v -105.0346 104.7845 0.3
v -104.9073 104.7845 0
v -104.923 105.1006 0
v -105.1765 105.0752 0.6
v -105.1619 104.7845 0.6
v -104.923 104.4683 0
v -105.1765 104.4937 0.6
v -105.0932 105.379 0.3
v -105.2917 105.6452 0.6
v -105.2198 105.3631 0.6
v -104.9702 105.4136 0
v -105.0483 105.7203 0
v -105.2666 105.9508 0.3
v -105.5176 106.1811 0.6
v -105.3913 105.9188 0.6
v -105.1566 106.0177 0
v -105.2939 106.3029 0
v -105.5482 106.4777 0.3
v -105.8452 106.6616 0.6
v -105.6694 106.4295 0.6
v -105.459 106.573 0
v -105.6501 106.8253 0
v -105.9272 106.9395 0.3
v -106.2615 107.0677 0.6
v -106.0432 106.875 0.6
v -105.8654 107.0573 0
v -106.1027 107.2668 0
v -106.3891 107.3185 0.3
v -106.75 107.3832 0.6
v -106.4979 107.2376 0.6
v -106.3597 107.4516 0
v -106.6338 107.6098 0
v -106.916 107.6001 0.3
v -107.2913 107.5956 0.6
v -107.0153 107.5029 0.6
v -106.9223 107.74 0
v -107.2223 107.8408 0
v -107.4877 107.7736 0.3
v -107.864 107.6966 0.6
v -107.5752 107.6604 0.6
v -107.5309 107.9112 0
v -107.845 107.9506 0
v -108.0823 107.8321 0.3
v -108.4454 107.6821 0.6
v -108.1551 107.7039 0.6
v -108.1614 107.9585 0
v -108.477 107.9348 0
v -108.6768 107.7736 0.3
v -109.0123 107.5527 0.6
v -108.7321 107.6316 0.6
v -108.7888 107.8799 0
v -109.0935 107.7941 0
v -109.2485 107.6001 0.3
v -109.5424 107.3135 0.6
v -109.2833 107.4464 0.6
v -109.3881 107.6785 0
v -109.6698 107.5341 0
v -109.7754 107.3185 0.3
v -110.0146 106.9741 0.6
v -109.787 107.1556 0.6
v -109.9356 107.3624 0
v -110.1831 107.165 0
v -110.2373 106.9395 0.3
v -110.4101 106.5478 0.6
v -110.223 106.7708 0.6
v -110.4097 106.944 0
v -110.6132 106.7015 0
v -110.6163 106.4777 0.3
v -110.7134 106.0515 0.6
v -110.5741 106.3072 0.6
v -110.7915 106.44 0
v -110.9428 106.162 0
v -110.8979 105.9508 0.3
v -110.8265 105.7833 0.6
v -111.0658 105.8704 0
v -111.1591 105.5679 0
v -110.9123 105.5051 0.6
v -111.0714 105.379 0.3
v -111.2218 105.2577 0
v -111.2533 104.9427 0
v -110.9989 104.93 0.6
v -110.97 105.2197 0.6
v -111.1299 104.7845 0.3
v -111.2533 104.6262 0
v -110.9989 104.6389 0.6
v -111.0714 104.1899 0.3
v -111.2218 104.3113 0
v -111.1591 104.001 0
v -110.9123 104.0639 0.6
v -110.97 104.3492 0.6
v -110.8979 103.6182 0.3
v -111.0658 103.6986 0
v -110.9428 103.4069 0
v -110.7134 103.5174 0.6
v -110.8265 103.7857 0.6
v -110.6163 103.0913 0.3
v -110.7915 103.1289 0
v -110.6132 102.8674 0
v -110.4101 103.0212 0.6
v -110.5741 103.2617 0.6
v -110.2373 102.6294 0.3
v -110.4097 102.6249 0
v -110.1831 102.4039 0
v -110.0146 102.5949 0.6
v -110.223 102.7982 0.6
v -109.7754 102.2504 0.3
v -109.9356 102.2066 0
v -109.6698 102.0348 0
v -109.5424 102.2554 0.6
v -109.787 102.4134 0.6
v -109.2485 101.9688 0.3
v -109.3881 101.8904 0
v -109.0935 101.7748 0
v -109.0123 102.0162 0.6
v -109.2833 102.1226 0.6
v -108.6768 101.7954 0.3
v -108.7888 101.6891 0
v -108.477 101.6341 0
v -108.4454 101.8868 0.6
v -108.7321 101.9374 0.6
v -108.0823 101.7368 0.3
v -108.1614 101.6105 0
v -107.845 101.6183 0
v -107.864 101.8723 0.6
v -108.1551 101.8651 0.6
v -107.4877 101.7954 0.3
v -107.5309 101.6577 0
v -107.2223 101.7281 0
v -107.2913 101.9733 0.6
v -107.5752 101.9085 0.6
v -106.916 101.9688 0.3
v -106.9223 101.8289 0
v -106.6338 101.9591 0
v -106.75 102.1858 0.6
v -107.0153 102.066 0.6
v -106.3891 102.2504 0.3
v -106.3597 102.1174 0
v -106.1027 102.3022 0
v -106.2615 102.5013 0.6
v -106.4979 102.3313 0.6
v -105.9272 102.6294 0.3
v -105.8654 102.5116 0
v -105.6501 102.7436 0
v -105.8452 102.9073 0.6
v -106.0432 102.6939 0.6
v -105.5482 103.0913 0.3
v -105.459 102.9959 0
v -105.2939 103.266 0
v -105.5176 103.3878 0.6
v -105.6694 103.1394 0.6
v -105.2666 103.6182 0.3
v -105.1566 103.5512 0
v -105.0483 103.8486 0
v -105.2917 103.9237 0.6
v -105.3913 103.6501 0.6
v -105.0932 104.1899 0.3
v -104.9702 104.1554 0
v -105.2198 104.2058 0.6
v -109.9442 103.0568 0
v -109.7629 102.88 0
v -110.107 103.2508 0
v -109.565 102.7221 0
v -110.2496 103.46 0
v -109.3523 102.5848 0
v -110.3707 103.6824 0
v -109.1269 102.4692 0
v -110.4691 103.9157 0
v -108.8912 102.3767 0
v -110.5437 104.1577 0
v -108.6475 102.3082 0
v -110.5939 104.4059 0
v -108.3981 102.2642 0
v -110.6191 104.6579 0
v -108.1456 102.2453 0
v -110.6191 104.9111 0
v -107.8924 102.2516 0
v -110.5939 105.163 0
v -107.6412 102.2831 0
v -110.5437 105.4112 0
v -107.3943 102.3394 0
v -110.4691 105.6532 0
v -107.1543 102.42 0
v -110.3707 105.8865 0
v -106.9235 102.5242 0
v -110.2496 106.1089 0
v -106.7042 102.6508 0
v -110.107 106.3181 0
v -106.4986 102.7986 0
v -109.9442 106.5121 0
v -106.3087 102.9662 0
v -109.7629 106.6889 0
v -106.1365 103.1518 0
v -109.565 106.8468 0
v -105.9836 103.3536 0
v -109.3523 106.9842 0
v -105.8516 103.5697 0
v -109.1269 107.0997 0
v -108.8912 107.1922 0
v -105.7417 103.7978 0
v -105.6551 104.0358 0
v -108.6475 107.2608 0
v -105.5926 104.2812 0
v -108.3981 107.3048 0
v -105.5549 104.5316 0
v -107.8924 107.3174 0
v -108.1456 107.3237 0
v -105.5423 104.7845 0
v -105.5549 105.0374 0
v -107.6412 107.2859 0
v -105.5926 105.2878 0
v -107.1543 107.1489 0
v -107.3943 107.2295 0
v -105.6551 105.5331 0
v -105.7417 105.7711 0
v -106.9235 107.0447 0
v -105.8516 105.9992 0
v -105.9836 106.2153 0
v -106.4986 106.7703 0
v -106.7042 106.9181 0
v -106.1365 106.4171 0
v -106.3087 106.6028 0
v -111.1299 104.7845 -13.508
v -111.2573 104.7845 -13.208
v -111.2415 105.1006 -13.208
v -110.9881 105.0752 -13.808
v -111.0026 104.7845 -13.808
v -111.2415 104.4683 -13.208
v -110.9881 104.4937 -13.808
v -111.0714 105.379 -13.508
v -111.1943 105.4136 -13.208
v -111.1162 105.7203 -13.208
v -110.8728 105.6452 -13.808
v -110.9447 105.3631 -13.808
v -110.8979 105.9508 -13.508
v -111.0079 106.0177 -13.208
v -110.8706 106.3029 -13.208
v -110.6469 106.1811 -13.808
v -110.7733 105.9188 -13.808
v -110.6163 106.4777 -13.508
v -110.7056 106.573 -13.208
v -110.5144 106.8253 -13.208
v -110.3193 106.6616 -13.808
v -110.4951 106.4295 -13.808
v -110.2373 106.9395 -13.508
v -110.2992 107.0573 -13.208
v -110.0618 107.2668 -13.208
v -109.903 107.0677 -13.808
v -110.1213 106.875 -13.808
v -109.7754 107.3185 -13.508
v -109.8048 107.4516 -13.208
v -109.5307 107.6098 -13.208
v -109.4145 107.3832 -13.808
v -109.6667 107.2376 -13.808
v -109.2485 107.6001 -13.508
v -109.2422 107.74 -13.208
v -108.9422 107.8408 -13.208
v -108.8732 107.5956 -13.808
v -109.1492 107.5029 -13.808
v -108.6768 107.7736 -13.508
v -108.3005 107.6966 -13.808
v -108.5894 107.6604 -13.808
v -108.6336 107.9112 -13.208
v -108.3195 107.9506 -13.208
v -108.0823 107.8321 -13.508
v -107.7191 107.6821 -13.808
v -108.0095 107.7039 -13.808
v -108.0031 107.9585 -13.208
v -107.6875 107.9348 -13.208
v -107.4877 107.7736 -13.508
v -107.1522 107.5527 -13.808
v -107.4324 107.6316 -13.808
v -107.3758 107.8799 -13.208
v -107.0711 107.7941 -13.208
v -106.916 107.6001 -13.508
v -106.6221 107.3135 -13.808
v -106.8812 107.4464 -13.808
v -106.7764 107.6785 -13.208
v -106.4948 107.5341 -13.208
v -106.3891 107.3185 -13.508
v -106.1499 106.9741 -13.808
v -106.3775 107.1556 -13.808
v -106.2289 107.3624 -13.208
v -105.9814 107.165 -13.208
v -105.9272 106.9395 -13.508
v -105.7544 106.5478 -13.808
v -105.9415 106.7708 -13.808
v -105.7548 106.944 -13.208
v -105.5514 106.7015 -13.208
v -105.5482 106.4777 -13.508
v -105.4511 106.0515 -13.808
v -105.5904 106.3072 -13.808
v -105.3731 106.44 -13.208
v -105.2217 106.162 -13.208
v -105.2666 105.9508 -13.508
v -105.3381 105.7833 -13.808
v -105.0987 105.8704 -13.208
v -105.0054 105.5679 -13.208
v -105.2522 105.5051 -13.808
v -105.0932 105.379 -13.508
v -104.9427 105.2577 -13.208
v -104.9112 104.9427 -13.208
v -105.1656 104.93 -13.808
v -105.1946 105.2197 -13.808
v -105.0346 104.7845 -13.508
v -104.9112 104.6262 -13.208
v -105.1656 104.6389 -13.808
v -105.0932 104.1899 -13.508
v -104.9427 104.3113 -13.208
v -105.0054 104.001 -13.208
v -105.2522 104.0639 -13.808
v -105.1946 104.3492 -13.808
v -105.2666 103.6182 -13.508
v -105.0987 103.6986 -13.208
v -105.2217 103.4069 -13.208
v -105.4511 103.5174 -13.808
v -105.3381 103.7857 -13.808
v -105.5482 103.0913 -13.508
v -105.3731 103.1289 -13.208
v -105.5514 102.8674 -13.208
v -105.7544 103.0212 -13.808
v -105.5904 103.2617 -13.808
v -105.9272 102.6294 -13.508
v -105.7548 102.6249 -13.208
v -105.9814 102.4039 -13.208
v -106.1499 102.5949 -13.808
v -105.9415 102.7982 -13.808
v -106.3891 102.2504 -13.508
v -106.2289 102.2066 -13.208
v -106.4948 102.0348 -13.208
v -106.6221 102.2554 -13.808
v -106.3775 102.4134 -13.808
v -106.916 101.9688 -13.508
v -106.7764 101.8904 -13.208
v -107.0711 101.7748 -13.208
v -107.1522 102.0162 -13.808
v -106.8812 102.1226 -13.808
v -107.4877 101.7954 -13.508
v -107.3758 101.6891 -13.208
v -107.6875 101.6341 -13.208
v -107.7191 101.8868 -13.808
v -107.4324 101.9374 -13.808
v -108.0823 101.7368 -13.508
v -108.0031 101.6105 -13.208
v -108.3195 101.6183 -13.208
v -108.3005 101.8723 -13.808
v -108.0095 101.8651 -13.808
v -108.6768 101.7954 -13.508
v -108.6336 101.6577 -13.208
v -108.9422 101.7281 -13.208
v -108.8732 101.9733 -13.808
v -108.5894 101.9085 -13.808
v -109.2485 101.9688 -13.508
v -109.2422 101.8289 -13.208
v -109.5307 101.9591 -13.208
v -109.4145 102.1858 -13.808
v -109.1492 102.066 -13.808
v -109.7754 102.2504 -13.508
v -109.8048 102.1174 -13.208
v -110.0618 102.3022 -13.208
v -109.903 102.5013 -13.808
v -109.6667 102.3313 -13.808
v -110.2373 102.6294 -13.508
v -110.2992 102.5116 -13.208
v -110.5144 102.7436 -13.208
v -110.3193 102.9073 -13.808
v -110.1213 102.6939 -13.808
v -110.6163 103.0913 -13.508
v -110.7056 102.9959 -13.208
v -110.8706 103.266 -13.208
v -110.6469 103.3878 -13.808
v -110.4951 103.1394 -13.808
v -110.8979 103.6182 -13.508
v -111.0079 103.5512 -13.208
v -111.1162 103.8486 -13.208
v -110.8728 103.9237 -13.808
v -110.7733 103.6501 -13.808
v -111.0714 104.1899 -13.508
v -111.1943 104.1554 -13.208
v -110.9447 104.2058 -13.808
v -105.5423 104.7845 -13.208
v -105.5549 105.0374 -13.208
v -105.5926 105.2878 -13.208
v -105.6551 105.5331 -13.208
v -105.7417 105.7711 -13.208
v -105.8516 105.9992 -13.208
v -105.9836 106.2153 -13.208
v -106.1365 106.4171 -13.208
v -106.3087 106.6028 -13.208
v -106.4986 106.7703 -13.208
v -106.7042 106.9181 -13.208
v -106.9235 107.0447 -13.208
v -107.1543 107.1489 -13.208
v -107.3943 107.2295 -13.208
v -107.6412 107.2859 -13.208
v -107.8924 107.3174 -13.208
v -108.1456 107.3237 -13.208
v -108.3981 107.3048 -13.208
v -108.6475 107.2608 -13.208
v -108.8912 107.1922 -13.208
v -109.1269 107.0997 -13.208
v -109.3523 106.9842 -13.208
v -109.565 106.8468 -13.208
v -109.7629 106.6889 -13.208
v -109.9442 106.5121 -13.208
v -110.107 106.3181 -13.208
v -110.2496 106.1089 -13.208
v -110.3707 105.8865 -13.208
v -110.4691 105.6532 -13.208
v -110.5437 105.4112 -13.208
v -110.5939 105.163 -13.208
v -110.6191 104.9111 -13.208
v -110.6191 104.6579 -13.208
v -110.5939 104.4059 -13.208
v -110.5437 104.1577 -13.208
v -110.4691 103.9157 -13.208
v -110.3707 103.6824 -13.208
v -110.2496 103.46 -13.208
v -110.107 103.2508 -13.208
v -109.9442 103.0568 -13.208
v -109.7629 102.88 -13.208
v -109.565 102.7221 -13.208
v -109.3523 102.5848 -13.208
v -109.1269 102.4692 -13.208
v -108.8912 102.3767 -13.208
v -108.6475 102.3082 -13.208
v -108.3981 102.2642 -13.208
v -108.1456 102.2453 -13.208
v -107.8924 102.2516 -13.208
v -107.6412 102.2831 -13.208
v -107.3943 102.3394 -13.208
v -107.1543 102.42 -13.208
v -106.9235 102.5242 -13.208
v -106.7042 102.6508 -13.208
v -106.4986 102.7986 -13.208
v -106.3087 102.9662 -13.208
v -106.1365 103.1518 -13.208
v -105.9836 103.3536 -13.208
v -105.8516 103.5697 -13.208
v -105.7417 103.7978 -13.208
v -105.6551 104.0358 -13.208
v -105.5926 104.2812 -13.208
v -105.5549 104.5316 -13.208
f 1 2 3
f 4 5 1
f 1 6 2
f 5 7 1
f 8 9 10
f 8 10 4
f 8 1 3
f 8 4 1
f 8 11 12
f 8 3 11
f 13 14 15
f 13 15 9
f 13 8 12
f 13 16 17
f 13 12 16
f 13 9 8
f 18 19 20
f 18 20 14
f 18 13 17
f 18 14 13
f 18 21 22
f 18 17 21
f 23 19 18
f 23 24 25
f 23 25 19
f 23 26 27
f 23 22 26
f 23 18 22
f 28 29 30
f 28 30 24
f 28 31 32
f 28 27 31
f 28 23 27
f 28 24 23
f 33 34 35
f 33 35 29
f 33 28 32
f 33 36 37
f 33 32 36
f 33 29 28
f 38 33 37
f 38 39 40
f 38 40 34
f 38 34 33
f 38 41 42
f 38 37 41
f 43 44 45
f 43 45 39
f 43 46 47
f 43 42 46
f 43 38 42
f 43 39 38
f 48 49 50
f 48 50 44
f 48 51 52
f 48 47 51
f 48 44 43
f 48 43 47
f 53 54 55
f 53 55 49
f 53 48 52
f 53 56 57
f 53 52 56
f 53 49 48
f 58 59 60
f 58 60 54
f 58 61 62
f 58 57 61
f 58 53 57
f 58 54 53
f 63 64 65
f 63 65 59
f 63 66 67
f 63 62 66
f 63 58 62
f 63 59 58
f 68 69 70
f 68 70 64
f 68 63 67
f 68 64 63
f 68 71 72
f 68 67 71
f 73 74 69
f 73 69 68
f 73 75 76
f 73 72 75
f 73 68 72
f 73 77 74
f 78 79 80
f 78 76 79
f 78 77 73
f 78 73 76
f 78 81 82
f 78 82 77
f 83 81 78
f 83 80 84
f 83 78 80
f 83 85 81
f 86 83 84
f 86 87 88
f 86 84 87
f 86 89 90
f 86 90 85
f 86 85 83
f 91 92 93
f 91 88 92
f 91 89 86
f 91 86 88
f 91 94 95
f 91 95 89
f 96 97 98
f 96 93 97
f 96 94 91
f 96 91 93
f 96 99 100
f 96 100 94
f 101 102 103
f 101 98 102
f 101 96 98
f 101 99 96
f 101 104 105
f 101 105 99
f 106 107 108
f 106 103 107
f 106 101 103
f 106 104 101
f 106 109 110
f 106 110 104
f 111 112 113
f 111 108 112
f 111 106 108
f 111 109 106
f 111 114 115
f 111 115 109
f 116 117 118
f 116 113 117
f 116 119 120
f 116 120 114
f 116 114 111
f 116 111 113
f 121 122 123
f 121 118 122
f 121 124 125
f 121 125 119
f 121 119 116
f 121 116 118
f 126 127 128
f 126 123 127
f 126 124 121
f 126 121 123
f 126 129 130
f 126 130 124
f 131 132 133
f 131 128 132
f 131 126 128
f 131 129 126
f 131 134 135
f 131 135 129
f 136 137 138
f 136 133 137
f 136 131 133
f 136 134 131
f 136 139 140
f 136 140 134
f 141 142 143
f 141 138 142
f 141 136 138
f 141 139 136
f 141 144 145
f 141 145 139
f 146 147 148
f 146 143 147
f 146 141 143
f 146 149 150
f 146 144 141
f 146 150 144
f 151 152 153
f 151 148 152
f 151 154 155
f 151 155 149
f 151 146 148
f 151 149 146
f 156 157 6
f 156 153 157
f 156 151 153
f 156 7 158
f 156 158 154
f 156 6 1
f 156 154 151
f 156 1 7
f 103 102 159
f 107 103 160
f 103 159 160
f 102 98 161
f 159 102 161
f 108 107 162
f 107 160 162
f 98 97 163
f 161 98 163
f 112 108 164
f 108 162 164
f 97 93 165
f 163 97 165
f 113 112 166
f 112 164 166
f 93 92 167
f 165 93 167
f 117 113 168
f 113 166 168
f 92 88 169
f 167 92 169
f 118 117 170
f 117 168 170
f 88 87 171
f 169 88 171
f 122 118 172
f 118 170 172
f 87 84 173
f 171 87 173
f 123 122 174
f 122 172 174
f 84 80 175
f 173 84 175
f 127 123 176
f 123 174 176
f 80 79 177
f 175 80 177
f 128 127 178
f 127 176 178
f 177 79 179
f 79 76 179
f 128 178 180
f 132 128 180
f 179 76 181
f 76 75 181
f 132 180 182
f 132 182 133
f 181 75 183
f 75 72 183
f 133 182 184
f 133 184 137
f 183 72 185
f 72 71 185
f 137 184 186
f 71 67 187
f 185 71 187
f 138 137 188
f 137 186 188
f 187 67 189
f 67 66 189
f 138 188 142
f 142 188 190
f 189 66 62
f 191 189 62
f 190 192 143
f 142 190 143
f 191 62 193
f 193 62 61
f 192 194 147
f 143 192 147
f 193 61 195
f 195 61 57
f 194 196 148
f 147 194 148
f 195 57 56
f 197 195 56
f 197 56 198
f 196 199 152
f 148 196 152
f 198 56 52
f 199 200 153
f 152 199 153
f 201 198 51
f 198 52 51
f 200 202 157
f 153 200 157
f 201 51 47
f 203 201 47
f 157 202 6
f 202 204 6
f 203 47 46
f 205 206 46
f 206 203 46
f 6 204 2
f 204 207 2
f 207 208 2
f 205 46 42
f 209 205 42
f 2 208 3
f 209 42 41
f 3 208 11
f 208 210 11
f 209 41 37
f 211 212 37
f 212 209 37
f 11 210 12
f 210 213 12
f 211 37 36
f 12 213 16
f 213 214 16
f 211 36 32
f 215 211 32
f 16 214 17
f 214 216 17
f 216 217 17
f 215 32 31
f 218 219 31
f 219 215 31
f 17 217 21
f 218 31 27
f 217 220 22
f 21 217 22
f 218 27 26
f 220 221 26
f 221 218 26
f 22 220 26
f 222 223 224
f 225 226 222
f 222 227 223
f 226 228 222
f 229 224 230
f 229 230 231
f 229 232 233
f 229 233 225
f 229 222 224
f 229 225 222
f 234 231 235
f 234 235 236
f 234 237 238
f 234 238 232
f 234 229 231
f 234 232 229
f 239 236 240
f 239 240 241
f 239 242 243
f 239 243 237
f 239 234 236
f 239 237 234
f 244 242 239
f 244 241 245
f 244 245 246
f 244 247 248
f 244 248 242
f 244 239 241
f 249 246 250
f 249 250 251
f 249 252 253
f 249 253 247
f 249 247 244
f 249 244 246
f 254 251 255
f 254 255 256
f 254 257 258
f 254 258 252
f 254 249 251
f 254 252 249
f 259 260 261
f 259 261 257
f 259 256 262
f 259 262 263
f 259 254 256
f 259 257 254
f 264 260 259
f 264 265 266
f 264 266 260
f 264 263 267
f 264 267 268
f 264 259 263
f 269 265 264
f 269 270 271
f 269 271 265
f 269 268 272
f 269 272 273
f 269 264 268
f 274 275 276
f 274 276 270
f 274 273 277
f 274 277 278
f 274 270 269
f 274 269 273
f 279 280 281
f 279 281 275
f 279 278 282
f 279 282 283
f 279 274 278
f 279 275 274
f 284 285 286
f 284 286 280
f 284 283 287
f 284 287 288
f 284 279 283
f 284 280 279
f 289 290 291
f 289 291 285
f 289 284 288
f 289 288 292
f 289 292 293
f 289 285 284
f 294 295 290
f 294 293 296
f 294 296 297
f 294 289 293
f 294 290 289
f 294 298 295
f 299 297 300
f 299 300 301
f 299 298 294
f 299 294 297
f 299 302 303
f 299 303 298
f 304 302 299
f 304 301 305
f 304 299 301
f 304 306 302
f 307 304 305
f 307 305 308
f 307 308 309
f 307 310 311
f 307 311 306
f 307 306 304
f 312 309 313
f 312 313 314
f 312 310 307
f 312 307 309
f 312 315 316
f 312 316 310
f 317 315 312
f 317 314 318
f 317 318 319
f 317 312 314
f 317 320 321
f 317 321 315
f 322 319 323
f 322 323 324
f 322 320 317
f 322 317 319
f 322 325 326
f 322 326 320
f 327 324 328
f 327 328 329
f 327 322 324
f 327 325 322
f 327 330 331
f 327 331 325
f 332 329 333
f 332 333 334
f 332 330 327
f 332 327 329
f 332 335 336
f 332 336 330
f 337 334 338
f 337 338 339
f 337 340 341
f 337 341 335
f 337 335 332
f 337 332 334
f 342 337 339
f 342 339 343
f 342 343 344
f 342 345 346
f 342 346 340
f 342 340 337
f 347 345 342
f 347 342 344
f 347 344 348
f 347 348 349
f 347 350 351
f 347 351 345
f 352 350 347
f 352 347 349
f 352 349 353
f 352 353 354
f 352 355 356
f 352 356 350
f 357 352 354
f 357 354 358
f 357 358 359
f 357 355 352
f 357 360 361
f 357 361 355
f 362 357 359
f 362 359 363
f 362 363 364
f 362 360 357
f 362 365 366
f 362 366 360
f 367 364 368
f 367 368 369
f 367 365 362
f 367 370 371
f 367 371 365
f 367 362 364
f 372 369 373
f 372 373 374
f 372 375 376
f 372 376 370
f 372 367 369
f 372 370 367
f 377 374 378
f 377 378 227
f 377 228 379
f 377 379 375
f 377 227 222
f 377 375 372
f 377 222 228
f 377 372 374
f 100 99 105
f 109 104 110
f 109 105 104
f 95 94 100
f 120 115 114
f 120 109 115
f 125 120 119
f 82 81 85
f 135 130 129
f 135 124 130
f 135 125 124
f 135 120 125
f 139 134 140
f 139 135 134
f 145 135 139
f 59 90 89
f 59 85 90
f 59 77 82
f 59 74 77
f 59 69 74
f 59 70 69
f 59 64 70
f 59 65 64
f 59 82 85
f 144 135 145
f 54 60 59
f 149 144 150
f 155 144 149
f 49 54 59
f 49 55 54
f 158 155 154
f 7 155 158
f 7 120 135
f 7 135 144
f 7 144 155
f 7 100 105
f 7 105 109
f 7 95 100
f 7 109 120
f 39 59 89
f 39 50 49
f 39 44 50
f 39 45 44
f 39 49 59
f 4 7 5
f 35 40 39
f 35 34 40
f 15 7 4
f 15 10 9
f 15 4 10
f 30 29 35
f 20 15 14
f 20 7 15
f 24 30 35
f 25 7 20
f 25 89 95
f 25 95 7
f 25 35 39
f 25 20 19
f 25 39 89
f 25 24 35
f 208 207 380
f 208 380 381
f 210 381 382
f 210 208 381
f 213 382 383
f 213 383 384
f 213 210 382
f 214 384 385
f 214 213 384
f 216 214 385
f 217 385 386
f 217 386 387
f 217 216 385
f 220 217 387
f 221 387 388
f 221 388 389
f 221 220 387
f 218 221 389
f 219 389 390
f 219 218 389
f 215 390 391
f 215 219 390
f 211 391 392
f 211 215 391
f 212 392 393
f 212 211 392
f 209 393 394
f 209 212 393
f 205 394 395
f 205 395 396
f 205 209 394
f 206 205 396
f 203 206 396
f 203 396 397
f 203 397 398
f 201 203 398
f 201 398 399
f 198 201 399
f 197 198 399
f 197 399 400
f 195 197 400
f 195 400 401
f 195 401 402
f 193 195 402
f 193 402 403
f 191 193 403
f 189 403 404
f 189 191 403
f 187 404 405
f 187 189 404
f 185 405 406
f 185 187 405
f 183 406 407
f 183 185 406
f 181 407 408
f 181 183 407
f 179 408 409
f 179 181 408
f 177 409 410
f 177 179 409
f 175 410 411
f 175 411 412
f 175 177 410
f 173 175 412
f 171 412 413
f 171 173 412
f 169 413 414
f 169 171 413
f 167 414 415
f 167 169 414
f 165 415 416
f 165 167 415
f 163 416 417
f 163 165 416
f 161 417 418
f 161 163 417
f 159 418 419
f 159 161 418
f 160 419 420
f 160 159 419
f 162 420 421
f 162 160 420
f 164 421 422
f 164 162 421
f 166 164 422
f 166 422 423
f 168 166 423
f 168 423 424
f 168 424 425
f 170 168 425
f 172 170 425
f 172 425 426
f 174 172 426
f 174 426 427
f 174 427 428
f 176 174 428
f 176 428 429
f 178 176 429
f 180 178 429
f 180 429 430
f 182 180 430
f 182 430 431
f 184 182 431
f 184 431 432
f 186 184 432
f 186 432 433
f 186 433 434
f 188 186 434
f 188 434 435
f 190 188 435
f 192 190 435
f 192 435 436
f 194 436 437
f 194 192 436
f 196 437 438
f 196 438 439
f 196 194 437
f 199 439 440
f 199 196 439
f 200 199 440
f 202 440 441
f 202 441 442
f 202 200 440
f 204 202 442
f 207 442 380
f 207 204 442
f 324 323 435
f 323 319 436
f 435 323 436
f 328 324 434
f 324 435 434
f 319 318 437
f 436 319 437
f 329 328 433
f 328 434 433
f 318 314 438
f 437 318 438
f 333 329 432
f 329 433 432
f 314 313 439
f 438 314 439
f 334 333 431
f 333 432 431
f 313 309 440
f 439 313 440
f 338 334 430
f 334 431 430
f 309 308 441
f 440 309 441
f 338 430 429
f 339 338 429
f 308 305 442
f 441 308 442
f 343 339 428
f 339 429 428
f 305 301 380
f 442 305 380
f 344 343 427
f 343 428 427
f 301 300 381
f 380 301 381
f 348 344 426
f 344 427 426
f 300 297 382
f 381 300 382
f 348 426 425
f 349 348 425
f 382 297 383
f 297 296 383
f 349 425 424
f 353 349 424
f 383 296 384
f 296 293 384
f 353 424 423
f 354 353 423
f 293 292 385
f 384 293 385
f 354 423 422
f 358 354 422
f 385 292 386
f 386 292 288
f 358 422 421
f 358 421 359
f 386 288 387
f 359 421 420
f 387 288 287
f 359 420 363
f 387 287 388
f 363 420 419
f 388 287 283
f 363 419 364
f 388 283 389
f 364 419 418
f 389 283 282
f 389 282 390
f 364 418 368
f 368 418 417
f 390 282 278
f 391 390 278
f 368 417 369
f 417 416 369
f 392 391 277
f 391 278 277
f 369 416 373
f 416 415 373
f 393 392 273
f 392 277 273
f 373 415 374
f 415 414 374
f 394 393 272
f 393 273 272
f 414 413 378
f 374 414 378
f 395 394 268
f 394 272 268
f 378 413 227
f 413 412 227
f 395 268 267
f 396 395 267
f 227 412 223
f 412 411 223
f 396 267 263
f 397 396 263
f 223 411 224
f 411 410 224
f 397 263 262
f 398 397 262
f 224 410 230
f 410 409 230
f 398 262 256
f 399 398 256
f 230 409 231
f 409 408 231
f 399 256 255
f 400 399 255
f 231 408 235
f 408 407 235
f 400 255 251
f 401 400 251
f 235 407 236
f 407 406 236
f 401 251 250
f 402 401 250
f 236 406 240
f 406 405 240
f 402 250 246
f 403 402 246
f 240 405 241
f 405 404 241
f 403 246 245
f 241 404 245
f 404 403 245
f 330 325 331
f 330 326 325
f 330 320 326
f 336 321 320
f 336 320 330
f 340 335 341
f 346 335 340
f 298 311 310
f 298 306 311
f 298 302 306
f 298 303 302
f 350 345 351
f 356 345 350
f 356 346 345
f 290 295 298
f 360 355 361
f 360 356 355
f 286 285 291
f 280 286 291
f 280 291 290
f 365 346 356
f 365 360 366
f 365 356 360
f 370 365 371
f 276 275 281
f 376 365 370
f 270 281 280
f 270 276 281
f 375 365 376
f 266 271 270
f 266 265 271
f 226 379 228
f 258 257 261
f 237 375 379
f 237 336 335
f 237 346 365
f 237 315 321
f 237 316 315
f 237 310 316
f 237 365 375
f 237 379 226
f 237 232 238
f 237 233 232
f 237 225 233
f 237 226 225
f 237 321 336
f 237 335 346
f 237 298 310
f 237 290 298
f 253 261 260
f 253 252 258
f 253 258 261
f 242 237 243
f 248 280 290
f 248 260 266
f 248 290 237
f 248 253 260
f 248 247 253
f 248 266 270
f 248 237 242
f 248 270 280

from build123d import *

# Parameters (mm, degrees)
SKETCH1_R      = 2.54
EXTRUDE1_DEPTH = 13.208
SKETCH2_R      = 3.175
EXTRUDE2_DEPTH = 0.6
EXTRUDE2_TAPER = 23
SKETCH3_R      = 3.175
EXTRUDE3_DEPTH = 0.6
EXTRUDE3_TAPER = 23


with BuildPart() as part:
    # Sketch1 → Extrude1 (new body)
    with BuildSketch(Plane.XY):
        with Locations((-108.082258725, 104.784469075)):
            Circle(SKETCH1_R)
    extrude(amount=-EXTRUDE1_DEPTH)

    # Sketch2 → Extrude2 (add)
    with BuildSketch(Plane.XY):
        with Locations((-108.082258725, 104.784469075)):
            Circle(SKETCH2_R)
    extrude(amount=EXTRUDE2_DEPTH, taper=EXTRUDE2_TAPER)

    # Sketch3 → Extrude3 (add)
    with BuildSketch(Plane(origin=(-216.039782036, 1.137132082, -13.208), x_dir=(-1, 0, 0), z_dir=(0, 0, -1))):
        with Locations((-107.957523311, 103.647336992)):
            Circle(SKETCH3_R)
    extrude(amount=EXTRUDE3_DEPTH, taper=EXTRUDE3_TAPER)


solid = part.part
